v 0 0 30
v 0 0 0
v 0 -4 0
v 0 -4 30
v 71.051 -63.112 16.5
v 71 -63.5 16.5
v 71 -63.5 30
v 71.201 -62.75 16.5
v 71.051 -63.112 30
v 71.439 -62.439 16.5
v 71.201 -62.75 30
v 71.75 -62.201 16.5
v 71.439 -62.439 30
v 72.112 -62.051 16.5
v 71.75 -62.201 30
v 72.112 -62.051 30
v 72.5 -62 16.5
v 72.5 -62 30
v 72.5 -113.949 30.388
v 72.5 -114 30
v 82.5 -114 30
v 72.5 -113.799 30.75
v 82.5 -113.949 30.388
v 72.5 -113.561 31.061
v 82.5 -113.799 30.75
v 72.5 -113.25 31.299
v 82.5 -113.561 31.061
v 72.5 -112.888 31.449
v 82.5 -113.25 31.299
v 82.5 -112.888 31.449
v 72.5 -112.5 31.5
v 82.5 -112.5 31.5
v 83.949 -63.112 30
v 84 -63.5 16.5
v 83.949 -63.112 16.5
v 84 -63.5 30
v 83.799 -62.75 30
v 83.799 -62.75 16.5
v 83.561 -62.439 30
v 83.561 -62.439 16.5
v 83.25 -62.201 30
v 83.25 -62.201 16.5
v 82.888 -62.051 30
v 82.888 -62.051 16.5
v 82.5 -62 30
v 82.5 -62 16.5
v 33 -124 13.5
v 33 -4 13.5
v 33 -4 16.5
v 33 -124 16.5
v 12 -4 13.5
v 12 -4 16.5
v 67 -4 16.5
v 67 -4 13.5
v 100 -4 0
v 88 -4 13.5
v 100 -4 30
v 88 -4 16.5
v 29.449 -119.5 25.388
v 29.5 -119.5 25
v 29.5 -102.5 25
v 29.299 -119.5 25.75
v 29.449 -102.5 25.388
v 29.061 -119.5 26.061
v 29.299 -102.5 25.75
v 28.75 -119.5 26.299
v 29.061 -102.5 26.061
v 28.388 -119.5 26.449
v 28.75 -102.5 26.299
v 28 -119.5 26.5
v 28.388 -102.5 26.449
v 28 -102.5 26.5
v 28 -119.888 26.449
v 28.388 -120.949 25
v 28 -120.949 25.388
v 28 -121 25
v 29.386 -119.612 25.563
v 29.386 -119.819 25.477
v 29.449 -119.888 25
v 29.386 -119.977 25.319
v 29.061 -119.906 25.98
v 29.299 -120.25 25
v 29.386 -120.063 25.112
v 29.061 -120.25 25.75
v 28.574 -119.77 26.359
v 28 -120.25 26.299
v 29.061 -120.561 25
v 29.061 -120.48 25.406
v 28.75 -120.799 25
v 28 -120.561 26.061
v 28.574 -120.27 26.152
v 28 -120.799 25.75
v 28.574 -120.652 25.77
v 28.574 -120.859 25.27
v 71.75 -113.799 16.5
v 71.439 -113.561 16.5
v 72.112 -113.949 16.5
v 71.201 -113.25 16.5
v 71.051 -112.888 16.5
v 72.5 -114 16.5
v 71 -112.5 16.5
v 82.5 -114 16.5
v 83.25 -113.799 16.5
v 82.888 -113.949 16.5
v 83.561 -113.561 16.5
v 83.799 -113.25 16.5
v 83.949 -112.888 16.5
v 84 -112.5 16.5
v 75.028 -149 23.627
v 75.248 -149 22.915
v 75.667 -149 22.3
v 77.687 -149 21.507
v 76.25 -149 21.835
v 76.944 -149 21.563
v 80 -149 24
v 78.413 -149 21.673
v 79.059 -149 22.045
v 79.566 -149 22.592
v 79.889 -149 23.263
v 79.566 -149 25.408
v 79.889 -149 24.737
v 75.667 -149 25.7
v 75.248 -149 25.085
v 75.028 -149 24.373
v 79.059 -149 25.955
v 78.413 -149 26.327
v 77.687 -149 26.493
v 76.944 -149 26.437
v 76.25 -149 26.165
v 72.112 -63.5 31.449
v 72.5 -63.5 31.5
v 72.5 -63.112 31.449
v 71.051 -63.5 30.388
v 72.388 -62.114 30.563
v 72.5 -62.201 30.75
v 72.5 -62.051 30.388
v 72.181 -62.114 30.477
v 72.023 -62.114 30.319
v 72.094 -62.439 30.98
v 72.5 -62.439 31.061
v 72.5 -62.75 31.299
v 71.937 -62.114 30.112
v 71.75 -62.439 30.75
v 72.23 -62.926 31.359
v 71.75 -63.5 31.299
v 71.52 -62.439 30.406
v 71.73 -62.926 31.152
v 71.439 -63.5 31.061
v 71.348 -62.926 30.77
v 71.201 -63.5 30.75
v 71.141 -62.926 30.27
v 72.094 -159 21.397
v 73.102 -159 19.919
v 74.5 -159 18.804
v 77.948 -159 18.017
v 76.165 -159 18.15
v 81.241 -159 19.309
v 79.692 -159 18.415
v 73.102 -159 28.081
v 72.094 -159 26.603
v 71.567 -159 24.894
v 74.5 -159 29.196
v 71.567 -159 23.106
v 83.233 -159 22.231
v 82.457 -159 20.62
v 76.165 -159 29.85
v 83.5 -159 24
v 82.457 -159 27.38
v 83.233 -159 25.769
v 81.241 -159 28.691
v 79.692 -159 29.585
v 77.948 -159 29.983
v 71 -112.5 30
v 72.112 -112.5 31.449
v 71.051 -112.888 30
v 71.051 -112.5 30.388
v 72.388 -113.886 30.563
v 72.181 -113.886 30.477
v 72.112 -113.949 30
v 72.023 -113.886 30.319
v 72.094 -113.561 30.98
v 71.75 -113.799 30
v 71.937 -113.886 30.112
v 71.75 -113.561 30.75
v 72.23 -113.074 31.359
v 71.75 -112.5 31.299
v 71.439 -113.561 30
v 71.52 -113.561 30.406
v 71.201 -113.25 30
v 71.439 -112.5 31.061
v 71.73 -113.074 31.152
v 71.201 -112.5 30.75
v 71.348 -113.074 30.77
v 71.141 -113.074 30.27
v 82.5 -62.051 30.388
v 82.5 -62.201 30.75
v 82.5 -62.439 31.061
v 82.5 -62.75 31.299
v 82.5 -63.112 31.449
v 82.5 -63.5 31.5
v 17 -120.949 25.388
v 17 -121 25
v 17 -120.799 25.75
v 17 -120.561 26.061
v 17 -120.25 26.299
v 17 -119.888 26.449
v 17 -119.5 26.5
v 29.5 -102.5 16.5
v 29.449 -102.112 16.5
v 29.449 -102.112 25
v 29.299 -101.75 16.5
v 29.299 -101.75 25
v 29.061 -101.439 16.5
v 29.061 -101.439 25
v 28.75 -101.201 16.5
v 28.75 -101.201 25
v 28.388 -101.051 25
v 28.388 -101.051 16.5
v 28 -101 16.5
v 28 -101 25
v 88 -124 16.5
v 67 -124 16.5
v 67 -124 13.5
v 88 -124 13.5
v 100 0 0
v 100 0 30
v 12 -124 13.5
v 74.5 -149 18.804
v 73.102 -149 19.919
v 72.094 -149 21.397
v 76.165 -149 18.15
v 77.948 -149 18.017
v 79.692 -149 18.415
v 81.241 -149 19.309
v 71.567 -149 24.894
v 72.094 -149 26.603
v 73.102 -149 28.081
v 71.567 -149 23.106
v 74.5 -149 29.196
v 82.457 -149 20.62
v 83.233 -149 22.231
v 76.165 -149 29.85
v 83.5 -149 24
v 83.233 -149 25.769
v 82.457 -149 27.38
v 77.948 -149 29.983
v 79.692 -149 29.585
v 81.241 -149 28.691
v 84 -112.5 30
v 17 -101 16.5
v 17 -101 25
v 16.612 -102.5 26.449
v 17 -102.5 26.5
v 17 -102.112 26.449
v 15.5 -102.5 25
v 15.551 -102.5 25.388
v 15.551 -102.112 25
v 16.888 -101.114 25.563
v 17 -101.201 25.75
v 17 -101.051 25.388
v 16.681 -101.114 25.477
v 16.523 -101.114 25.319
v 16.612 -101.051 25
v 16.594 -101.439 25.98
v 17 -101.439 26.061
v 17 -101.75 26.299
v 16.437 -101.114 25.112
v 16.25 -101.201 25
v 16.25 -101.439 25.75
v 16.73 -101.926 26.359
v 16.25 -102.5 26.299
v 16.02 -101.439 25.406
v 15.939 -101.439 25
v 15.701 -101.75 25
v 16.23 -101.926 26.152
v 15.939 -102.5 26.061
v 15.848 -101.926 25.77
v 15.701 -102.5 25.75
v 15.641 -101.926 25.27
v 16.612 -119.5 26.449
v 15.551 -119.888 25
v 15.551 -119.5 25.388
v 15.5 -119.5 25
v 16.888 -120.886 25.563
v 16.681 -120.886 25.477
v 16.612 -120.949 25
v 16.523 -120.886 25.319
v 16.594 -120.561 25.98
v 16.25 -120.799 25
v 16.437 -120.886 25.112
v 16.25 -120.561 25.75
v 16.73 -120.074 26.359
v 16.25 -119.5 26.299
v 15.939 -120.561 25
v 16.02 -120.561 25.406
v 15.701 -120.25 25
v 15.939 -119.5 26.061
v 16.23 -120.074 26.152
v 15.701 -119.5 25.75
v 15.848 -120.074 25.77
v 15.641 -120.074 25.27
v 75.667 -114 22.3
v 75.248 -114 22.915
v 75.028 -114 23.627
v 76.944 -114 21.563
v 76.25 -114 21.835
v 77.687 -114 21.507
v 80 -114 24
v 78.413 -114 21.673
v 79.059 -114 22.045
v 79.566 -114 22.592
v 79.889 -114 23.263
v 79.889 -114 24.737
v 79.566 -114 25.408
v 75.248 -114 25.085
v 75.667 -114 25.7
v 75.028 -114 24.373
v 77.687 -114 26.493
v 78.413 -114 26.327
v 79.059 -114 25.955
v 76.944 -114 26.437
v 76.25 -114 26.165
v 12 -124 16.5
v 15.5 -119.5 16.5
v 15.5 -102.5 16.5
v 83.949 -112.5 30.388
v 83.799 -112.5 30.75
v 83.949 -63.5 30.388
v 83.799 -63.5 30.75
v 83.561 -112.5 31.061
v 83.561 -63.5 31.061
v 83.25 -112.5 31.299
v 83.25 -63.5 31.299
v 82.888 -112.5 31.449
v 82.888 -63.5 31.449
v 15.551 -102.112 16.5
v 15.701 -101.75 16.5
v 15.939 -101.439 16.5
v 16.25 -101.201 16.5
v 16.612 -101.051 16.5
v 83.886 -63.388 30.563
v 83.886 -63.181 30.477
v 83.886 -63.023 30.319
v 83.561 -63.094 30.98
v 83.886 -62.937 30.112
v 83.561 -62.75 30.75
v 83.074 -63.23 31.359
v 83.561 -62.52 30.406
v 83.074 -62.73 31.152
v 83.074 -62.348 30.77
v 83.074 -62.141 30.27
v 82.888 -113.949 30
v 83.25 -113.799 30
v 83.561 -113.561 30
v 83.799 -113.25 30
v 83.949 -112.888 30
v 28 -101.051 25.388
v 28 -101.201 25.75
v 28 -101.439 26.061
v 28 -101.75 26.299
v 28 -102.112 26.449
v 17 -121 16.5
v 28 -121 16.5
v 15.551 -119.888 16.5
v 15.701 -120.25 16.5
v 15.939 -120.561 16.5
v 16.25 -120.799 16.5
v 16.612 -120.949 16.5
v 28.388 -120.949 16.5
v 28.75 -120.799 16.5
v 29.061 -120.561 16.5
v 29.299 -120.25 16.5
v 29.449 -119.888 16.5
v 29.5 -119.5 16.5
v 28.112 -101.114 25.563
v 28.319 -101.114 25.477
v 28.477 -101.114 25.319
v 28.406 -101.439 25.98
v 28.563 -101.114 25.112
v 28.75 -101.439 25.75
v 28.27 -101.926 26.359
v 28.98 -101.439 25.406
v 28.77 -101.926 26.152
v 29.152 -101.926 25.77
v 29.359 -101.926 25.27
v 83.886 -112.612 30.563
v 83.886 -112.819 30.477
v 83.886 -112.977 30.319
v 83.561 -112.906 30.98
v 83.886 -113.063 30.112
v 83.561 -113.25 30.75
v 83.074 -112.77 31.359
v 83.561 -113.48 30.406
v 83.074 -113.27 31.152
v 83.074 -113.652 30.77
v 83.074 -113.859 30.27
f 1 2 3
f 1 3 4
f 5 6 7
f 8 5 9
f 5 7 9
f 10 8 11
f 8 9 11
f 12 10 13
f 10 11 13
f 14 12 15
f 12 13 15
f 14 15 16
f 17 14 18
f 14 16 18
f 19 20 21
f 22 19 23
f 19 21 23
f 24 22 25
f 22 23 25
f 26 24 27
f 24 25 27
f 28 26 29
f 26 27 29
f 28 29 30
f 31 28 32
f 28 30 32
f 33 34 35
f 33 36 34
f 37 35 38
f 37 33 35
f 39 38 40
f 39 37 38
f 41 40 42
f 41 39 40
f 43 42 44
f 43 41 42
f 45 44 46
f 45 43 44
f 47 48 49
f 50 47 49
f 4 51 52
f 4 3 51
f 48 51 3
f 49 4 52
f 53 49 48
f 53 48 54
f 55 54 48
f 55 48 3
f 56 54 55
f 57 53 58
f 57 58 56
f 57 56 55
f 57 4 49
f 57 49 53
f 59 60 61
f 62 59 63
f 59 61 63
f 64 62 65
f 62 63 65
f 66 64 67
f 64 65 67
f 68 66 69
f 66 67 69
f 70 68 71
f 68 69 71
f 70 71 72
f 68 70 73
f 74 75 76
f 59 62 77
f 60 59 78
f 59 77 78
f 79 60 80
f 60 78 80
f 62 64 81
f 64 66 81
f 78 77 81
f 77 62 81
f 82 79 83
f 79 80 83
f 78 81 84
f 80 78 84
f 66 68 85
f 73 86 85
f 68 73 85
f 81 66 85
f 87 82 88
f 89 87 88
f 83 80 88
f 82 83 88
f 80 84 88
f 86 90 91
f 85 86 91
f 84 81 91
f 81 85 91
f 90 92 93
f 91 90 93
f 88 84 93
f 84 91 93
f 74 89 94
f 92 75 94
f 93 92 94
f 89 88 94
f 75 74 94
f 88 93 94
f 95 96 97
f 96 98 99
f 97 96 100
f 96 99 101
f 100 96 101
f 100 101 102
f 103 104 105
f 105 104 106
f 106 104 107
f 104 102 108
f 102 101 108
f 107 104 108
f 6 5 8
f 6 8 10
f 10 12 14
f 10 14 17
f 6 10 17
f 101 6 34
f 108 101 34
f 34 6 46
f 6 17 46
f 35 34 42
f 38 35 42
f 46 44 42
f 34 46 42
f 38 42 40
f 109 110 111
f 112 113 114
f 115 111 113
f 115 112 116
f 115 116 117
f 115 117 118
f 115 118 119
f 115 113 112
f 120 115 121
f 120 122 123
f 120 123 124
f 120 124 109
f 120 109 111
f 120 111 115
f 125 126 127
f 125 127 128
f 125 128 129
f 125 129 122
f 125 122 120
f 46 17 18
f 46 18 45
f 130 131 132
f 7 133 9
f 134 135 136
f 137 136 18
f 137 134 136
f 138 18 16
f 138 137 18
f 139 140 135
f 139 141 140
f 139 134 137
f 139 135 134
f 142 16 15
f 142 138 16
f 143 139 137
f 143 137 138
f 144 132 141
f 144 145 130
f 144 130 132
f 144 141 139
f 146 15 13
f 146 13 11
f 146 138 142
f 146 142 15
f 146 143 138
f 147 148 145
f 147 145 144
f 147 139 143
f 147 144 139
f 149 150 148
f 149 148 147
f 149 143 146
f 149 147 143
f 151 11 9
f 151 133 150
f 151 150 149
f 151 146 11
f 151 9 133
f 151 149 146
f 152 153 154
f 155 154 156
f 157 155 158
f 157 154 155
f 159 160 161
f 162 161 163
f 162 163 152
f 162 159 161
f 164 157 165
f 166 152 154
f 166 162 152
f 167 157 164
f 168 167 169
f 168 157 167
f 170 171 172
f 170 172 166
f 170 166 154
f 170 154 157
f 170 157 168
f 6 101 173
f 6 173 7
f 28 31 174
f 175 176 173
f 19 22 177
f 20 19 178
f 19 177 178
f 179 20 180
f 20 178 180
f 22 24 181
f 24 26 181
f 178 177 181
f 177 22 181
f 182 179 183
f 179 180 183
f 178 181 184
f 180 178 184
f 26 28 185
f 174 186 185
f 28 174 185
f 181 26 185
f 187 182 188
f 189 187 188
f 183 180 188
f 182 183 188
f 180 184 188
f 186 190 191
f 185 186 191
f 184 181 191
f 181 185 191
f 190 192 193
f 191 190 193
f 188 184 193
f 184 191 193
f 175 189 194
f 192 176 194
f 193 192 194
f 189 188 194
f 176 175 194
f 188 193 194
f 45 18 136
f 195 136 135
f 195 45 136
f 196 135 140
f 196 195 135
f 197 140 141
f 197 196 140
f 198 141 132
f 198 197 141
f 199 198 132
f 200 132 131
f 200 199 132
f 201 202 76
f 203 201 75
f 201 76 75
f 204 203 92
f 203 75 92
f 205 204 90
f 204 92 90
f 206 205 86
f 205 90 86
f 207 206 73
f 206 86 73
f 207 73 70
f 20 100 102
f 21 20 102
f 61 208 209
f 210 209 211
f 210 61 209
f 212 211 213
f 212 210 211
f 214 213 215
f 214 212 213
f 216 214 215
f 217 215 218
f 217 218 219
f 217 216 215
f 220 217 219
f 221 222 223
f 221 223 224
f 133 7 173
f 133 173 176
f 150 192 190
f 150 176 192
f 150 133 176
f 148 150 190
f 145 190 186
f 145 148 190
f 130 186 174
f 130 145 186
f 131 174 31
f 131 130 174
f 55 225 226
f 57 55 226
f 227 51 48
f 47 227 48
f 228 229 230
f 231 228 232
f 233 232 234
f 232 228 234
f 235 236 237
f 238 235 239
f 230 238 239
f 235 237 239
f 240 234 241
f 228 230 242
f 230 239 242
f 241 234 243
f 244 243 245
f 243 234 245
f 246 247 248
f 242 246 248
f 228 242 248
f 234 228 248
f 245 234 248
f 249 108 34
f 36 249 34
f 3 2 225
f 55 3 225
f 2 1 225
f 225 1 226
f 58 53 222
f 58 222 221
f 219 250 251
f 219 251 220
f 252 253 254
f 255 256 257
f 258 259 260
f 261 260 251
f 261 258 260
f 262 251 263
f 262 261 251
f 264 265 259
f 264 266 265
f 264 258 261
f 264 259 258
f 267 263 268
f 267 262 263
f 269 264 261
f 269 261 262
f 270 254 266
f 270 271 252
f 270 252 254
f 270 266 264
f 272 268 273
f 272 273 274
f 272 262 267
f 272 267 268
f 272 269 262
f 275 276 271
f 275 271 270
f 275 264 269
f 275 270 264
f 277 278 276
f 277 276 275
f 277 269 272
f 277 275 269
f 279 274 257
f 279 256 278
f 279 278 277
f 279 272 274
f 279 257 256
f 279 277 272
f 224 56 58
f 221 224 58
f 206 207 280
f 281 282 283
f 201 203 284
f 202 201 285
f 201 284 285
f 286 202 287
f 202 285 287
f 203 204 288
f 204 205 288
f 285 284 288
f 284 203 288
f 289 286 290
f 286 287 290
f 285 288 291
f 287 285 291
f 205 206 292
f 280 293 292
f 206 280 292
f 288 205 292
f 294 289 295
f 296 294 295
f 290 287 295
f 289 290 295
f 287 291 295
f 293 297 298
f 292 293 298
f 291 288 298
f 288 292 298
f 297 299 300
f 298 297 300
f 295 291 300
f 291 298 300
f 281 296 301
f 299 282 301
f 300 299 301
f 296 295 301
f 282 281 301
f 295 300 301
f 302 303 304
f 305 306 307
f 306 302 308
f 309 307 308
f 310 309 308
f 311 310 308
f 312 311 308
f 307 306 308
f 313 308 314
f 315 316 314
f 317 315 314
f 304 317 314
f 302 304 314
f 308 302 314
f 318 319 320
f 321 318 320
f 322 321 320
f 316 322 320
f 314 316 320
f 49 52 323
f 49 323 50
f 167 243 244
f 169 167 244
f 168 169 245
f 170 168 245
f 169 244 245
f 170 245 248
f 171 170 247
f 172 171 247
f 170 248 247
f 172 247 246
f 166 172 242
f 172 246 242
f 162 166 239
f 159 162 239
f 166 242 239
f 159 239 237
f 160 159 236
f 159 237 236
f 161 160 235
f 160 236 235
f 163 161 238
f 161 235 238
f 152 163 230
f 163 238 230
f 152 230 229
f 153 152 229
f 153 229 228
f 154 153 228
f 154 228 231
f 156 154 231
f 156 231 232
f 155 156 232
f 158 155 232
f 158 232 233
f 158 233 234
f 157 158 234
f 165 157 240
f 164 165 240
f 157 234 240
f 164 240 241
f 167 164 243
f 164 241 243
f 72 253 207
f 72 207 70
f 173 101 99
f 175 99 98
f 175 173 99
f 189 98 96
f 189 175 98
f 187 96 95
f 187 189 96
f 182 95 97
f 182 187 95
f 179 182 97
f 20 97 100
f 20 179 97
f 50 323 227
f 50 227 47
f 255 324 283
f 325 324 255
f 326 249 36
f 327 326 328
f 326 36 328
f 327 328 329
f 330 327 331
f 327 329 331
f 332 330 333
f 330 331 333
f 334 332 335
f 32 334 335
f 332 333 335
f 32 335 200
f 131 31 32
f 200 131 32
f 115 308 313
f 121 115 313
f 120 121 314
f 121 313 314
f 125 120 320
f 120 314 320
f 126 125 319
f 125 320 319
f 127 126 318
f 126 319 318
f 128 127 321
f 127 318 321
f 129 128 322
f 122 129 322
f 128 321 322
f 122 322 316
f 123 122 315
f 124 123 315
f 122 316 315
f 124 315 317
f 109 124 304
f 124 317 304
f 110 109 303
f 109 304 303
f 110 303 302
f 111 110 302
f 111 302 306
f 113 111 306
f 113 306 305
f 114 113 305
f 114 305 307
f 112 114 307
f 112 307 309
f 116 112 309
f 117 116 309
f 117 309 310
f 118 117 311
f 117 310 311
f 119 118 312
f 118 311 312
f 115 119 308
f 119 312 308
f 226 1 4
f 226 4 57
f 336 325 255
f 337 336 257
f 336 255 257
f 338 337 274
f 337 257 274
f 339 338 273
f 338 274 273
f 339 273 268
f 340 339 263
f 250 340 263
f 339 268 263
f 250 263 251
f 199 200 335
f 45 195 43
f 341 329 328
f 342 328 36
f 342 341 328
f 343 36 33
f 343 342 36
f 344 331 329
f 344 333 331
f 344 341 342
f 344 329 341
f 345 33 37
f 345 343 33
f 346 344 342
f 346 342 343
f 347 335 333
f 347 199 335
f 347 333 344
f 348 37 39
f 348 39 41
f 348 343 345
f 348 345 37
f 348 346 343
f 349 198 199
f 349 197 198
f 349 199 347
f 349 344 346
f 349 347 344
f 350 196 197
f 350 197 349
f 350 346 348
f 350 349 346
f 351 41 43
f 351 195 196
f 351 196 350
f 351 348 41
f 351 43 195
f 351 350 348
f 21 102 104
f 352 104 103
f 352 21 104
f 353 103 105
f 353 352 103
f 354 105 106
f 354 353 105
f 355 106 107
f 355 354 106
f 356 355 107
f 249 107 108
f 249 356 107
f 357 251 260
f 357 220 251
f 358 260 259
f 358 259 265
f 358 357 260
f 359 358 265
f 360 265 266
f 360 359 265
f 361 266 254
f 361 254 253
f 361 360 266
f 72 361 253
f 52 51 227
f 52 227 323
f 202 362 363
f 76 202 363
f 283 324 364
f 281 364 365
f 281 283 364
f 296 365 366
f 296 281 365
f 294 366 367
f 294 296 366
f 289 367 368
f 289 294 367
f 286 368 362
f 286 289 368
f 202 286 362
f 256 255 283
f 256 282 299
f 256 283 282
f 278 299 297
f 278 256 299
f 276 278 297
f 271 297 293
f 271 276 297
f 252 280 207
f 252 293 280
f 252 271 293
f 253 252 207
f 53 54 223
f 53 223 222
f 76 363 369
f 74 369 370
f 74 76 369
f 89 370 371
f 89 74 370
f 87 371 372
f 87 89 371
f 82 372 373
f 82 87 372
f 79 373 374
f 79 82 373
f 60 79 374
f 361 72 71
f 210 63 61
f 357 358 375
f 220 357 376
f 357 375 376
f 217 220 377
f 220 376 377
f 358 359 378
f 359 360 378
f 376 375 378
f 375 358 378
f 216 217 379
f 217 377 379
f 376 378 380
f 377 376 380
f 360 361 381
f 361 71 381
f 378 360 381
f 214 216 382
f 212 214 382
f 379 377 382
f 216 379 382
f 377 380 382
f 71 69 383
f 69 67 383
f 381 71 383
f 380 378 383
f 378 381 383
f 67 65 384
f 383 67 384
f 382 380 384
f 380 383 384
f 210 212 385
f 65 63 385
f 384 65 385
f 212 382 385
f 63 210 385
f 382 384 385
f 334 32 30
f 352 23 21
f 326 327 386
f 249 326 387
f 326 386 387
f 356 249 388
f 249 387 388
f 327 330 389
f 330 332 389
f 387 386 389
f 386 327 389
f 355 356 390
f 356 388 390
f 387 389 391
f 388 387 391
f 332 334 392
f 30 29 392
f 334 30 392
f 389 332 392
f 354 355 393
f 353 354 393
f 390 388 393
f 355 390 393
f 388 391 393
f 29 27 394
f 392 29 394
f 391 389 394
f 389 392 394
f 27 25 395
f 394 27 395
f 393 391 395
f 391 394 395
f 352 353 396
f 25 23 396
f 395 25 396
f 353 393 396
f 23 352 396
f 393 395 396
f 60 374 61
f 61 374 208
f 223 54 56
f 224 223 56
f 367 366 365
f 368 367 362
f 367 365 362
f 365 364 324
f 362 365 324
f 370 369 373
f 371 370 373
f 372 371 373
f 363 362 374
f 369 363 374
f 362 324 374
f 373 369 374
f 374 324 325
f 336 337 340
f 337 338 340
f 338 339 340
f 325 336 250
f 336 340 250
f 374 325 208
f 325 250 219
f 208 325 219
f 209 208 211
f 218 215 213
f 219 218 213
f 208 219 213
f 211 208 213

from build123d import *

# Parameters (mm, degrees)
F0_W      = 100
F0_H      = 30
F1_DEPTH  = 4
F2_W      = 21
F2_H      = 3
F3_DEPTH  = 120
F4_W      = 13
F4_H      = 52
F5_DEPTH  = 15
F6_R      = 2.5
F7_DEPTH  = 35
F8_R      = 6
F9_DEPTH  = 10
F10_R     = 1.5
F11_W     = 14
F11_H     = 20
F12_DEPTH = 10
F13_R     = 1.5


with BuildPart() as f1:
    # F0 (on Front) → F1 (new body)
    with BuildSketch(Plane.XZ):
        with Locations((50, 15)):
            Rectangle(F0_W, F0_H)
    extrude(amount=F1_DEPTH)

    # F2 (on face) → F3 (join)
    with BuildSketch(Plane.XZ.offset(4)):
        with Locations((22.5, 15)):
            Rectangle(F2_W, F2_H)
        with Locations((77.5, 15)):
            Rectangle(F2_W, F2_H)
    extrude(amount=F3_DEPTH)


with BuildPart() as f5:
    # F4 (on face) → F5 (new body)
    with BuildSketch(Plane.XY.offset(16.5)):
        with Locations((77.5, -88)):
            Rectangle(F4_W, F4_H)
    extrude(amount=F5_DEPTH)

    # F10
    f10_edges = [f5.edges().sort_by_distance(p)[0] for p in [
        (71, -88, 31.5),
        (77.5, -62, 31.5),
        (77.5, -114, 31.5),
        (84, -88, 31.5),
        (84, -114, 24),
        (71, -114, 24),
        (84, -62, 24),
        (71, -62, 24),
    ]]
    fillet(f10_edges, radius=F10_R)


with BuildPart() as f7:
    # F6 (on face) → F7 (new body)
    with BuildSketch(Plane.XZ.offset(114)):
        with Locations((77.5, 24)):
            Circle(F6_R)
    extrude(amount=F7_DEPTH)


with BuildPart() as f9:
    # F8 (on face) → F9 (new body)
    with BuildSketch(Plane.XZ.offset(149)):
        with Locations((77.5, 24)):
            Circle(F8_R)
    extrude(amount=F9_DEPTH)


with BuildPart() as f12:
    # F11 (on face) → F12 (new body)
    with BuildSketch(Plane.XY.offset(16.5)):
        with Locations((22.5, -111)):
            Rectangle(F11_W, F11_H)
    extrude(amount=F12_DEPTH)

    # F13
    f13_edges = [f12.edges().sort_by_distance(p)[0] for p in [
        (15.5, -111, 26.5),
        (22.5, -121, 26.5),
        (29.5, -111, 26.5),
        (22.5, -101, 26.5),
        (15.5, -121, 21.5),
        (29.5, -121, 21.5),
        (15.5, -101, 21.5),
        (29.5, -101, 21.5),
    ]]
    fillet(f13_edges, radius=F13_R)


solid = Compound([f1.part, f5.part, f7.part, f9.part, f12.part])
